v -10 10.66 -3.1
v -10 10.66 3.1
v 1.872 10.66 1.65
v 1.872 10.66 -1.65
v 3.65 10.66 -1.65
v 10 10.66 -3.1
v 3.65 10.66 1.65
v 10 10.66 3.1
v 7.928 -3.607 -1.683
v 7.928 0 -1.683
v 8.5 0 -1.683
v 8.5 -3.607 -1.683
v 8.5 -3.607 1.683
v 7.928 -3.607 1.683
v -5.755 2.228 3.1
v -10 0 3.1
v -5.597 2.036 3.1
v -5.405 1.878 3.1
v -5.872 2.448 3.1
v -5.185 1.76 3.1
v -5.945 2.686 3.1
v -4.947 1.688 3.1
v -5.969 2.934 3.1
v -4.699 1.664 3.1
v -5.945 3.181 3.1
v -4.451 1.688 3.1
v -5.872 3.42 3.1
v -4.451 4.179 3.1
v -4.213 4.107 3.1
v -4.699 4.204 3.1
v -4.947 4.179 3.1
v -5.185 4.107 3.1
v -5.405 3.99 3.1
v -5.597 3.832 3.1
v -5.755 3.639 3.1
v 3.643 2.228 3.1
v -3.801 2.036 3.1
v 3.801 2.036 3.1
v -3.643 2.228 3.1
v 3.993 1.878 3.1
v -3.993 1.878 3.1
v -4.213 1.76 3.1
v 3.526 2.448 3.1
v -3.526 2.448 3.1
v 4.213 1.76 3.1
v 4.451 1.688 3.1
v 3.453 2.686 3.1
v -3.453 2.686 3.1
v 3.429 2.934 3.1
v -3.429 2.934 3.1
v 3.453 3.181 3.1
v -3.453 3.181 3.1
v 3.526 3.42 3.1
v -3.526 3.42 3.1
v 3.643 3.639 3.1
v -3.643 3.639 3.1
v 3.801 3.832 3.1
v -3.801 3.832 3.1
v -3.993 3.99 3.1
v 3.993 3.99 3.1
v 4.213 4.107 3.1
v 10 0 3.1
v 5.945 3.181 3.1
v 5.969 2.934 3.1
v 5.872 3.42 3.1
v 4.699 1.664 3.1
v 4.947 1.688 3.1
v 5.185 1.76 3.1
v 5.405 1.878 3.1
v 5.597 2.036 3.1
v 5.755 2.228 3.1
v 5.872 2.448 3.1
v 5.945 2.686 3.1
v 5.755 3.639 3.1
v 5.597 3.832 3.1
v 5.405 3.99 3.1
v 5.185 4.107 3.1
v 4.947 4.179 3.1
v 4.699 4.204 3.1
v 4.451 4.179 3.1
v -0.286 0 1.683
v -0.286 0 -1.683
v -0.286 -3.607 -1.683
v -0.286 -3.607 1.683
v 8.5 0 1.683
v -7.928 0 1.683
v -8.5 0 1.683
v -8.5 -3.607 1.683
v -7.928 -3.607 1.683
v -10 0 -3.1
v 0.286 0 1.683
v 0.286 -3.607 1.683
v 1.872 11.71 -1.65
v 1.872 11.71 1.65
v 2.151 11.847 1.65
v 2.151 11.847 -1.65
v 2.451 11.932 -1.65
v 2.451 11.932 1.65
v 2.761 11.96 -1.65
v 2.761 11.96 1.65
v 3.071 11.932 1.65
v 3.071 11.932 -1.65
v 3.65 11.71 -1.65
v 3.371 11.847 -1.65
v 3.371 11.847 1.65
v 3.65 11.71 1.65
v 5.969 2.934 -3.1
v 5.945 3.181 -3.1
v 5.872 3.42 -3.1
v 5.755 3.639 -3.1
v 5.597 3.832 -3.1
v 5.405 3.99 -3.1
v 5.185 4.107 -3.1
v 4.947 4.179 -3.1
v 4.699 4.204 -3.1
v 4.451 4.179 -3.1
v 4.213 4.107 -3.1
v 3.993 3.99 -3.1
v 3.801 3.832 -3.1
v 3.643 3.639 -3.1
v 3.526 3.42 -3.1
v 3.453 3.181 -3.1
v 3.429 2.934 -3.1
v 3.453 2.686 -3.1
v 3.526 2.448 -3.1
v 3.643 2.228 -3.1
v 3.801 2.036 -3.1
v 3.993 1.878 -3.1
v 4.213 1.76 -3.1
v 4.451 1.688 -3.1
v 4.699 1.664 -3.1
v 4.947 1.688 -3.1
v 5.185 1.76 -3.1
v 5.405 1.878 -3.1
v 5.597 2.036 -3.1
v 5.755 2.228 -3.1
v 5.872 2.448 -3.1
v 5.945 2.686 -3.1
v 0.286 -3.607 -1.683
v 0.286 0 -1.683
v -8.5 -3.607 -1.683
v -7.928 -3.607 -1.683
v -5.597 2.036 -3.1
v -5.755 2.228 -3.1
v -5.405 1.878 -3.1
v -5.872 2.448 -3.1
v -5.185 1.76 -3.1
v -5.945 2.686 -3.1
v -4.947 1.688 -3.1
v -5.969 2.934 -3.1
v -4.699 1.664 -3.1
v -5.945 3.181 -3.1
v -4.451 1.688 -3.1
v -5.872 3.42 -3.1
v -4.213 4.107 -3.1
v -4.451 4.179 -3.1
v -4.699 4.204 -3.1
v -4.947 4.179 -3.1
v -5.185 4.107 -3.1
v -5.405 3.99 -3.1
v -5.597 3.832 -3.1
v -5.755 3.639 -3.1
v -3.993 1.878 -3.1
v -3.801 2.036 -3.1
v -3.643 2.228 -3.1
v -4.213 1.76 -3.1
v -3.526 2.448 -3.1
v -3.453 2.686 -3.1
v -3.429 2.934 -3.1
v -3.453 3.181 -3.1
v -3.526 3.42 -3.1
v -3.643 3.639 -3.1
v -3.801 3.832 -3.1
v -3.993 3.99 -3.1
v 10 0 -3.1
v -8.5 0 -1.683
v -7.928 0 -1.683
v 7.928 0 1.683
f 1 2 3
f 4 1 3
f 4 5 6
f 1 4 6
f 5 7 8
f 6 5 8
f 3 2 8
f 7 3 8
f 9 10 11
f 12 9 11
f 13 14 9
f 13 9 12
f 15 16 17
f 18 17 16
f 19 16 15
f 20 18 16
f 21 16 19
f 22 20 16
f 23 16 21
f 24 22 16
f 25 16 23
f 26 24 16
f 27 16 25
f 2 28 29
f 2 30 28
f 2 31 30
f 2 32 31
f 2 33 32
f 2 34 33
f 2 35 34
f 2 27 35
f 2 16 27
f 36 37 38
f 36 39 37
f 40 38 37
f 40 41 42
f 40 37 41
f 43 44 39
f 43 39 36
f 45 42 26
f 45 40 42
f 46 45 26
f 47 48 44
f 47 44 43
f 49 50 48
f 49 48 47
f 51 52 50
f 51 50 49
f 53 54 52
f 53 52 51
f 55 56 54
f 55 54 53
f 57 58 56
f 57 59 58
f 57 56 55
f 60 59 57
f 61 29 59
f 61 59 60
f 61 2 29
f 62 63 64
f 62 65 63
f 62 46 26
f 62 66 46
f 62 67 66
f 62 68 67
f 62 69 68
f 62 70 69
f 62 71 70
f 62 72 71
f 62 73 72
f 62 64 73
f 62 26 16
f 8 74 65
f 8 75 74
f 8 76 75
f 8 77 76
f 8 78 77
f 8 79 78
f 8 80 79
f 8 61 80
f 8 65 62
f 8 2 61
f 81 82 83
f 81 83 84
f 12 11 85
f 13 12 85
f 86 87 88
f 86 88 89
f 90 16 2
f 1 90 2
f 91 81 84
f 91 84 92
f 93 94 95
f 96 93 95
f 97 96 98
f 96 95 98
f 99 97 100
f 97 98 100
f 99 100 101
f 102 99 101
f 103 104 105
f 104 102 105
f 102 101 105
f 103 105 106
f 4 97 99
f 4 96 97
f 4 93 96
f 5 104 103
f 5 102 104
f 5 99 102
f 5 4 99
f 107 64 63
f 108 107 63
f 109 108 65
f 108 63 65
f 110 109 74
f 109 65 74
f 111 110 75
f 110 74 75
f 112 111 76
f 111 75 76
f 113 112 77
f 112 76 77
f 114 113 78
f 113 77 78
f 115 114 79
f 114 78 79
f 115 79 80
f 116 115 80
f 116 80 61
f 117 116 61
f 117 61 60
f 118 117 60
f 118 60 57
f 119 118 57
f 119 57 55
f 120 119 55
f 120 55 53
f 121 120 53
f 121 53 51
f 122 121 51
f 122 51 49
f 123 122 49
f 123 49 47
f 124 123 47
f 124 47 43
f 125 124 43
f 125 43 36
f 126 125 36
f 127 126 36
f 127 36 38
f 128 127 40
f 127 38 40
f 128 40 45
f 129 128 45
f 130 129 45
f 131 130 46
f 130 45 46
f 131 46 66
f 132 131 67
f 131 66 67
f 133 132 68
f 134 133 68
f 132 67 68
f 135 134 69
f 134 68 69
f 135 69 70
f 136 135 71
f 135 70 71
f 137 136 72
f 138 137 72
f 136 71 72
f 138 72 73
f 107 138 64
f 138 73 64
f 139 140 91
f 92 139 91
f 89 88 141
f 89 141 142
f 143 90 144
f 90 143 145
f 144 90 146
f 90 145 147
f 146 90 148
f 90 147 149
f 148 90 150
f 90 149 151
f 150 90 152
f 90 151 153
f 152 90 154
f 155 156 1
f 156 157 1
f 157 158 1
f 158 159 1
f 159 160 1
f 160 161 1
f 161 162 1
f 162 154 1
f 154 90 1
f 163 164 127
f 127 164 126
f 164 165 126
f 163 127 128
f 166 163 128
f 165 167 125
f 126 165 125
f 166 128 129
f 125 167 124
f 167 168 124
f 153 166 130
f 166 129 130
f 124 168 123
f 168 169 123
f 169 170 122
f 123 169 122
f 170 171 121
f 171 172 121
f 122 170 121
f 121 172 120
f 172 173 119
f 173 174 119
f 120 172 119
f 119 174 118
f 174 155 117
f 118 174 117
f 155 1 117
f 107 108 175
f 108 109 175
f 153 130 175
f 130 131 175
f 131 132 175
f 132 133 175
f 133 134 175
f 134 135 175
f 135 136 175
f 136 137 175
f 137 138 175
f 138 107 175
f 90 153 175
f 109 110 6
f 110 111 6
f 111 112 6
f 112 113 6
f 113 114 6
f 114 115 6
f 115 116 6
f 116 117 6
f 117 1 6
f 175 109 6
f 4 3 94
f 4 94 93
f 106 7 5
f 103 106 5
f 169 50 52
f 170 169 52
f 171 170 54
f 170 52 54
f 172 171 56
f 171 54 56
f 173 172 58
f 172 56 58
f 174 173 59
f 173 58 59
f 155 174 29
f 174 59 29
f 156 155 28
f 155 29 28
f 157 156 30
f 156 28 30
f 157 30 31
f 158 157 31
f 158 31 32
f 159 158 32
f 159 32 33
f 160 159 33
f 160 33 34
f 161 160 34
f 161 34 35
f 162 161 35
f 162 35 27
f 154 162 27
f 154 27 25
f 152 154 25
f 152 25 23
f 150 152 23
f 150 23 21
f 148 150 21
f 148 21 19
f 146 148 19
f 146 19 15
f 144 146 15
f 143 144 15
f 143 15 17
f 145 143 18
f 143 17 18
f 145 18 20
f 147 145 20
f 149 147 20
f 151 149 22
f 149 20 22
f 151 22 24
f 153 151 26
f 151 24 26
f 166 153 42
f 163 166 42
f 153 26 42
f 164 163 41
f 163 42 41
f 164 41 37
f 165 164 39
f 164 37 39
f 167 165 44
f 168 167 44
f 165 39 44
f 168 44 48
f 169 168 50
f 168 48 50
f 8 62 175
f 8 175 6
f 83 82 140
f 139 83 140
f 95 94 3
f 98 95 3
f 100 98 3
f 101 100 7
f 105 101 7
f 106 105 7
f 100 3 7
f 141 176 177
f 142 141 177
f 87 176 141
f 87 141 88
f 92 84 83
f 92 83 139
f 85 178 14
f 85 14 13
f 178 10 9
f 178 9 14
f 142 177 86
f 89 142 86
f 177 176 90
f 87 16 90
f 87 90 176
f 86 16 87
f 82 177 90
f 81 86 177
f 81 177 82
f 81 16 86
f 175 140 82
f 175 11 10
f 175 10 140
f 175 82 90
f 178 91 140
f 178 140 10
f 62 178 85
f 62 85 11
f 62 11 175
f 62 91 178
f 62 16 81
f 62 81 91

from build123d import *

# Parameters (mm, degrees)
SKETCH1_W           = 20
SKETCH1_H           = 10.66
BOSS_EXTRUDE1_DEPTH = 3.1
SKETCH2_R           = 1.27
CUT_EXTRUDE1_DEPTH  = 7.2
SKETCH3_W           = 0.5715
SKETCH3_H           = 3.3655
BOSS_EXTRUDE2_DEPTH = 3.6068
SKETCH4_W           = 1.778
SKETCH4_H           = 3.3
BOSS_EXTRUDE3_DEPTH = 1.3
CUT_EXTRUDE2_DEPTH  = 5.75


with BuildPart() as part:
    # Sketch1 → Boss-Extrude1 (new body, symmetric)
    with BuildSketch(Plane.XY):
        with Locations((0, 5.33)):
            Rectangle(SKETCH1_W, SKETCH1_H)
    extrude(amount=BOSS_EXTRUDE1_DEPTH, both=True)

    # Sketch2 → Cut-Extrude1 (cut, through all)
    with BuildSketch(Plane.XY.offset(3.1)):
        with Locations((4.699, 2.9337)):
            Circle(SKETCH2_R)
        with Locations((-4.699, 2.9337)):
            Circle(SKETCH2_R)
    extrude(amount=-CUT_EXTRUDE1_DEPTH, mode=Mode.SUBTRACT)

    # Sketch3 → Boss-Extrude2 (add)
    with BuildSketch(Plane.XZ):
        with Locations((-8.21425, 0)):
            Rectangle(SKETCH3_W, SKETCH3_H)
        Rectangle(SKETCH3_W, SKETCH3_H)
        with Locations((8.21425, 0)):
            Rectangle(SKETCH3_W, SKETCH3_H)
    extrude(amount=BOSS_EXTRUDE2_DEPTH)

    # Sketch4 → Boss-Extrude3 (add)
    with BuildSketch(Plane(origin=(0, 10.66, 0), x_dir=(1, 0, 0), z_dir=(0, 1, 0))):
        with Locations((2.761, 0)):
            Rectangle(SKETCH4_W, SKETCH4_H)
    extrude(amount=BOSS_EXTRUDE3_DEPTH)

    # Sketch5 → Cut-Extrude2 (cut, through all)
    with BuildSketch(Plane.XY.offset(1.65)):
        with BuildLine():
            Line((1.872, 11.96), (1.872, 11.71))
            ThreePointArc((1.872, 11.71), (2.29925846, 11.896310917), (2.761, 11.96))
            Line((2.761, 11.96), (1.872, 11.96))
        make_face()
        with BuildLine():
            ThreePointArc((2.761, 11.96), (3.22274154, 11.896310917), (3.65, 11.71))
            Line((3.65, 11.71), (3.65, 11.96))
            Line((3.65, 11.96), (2.761, 11.96))
        make_face()
    extrude(amount=-CUT_EXTRUDE2_DEPTH, mode=Mode.SUBTRACT)


solid = part.part
